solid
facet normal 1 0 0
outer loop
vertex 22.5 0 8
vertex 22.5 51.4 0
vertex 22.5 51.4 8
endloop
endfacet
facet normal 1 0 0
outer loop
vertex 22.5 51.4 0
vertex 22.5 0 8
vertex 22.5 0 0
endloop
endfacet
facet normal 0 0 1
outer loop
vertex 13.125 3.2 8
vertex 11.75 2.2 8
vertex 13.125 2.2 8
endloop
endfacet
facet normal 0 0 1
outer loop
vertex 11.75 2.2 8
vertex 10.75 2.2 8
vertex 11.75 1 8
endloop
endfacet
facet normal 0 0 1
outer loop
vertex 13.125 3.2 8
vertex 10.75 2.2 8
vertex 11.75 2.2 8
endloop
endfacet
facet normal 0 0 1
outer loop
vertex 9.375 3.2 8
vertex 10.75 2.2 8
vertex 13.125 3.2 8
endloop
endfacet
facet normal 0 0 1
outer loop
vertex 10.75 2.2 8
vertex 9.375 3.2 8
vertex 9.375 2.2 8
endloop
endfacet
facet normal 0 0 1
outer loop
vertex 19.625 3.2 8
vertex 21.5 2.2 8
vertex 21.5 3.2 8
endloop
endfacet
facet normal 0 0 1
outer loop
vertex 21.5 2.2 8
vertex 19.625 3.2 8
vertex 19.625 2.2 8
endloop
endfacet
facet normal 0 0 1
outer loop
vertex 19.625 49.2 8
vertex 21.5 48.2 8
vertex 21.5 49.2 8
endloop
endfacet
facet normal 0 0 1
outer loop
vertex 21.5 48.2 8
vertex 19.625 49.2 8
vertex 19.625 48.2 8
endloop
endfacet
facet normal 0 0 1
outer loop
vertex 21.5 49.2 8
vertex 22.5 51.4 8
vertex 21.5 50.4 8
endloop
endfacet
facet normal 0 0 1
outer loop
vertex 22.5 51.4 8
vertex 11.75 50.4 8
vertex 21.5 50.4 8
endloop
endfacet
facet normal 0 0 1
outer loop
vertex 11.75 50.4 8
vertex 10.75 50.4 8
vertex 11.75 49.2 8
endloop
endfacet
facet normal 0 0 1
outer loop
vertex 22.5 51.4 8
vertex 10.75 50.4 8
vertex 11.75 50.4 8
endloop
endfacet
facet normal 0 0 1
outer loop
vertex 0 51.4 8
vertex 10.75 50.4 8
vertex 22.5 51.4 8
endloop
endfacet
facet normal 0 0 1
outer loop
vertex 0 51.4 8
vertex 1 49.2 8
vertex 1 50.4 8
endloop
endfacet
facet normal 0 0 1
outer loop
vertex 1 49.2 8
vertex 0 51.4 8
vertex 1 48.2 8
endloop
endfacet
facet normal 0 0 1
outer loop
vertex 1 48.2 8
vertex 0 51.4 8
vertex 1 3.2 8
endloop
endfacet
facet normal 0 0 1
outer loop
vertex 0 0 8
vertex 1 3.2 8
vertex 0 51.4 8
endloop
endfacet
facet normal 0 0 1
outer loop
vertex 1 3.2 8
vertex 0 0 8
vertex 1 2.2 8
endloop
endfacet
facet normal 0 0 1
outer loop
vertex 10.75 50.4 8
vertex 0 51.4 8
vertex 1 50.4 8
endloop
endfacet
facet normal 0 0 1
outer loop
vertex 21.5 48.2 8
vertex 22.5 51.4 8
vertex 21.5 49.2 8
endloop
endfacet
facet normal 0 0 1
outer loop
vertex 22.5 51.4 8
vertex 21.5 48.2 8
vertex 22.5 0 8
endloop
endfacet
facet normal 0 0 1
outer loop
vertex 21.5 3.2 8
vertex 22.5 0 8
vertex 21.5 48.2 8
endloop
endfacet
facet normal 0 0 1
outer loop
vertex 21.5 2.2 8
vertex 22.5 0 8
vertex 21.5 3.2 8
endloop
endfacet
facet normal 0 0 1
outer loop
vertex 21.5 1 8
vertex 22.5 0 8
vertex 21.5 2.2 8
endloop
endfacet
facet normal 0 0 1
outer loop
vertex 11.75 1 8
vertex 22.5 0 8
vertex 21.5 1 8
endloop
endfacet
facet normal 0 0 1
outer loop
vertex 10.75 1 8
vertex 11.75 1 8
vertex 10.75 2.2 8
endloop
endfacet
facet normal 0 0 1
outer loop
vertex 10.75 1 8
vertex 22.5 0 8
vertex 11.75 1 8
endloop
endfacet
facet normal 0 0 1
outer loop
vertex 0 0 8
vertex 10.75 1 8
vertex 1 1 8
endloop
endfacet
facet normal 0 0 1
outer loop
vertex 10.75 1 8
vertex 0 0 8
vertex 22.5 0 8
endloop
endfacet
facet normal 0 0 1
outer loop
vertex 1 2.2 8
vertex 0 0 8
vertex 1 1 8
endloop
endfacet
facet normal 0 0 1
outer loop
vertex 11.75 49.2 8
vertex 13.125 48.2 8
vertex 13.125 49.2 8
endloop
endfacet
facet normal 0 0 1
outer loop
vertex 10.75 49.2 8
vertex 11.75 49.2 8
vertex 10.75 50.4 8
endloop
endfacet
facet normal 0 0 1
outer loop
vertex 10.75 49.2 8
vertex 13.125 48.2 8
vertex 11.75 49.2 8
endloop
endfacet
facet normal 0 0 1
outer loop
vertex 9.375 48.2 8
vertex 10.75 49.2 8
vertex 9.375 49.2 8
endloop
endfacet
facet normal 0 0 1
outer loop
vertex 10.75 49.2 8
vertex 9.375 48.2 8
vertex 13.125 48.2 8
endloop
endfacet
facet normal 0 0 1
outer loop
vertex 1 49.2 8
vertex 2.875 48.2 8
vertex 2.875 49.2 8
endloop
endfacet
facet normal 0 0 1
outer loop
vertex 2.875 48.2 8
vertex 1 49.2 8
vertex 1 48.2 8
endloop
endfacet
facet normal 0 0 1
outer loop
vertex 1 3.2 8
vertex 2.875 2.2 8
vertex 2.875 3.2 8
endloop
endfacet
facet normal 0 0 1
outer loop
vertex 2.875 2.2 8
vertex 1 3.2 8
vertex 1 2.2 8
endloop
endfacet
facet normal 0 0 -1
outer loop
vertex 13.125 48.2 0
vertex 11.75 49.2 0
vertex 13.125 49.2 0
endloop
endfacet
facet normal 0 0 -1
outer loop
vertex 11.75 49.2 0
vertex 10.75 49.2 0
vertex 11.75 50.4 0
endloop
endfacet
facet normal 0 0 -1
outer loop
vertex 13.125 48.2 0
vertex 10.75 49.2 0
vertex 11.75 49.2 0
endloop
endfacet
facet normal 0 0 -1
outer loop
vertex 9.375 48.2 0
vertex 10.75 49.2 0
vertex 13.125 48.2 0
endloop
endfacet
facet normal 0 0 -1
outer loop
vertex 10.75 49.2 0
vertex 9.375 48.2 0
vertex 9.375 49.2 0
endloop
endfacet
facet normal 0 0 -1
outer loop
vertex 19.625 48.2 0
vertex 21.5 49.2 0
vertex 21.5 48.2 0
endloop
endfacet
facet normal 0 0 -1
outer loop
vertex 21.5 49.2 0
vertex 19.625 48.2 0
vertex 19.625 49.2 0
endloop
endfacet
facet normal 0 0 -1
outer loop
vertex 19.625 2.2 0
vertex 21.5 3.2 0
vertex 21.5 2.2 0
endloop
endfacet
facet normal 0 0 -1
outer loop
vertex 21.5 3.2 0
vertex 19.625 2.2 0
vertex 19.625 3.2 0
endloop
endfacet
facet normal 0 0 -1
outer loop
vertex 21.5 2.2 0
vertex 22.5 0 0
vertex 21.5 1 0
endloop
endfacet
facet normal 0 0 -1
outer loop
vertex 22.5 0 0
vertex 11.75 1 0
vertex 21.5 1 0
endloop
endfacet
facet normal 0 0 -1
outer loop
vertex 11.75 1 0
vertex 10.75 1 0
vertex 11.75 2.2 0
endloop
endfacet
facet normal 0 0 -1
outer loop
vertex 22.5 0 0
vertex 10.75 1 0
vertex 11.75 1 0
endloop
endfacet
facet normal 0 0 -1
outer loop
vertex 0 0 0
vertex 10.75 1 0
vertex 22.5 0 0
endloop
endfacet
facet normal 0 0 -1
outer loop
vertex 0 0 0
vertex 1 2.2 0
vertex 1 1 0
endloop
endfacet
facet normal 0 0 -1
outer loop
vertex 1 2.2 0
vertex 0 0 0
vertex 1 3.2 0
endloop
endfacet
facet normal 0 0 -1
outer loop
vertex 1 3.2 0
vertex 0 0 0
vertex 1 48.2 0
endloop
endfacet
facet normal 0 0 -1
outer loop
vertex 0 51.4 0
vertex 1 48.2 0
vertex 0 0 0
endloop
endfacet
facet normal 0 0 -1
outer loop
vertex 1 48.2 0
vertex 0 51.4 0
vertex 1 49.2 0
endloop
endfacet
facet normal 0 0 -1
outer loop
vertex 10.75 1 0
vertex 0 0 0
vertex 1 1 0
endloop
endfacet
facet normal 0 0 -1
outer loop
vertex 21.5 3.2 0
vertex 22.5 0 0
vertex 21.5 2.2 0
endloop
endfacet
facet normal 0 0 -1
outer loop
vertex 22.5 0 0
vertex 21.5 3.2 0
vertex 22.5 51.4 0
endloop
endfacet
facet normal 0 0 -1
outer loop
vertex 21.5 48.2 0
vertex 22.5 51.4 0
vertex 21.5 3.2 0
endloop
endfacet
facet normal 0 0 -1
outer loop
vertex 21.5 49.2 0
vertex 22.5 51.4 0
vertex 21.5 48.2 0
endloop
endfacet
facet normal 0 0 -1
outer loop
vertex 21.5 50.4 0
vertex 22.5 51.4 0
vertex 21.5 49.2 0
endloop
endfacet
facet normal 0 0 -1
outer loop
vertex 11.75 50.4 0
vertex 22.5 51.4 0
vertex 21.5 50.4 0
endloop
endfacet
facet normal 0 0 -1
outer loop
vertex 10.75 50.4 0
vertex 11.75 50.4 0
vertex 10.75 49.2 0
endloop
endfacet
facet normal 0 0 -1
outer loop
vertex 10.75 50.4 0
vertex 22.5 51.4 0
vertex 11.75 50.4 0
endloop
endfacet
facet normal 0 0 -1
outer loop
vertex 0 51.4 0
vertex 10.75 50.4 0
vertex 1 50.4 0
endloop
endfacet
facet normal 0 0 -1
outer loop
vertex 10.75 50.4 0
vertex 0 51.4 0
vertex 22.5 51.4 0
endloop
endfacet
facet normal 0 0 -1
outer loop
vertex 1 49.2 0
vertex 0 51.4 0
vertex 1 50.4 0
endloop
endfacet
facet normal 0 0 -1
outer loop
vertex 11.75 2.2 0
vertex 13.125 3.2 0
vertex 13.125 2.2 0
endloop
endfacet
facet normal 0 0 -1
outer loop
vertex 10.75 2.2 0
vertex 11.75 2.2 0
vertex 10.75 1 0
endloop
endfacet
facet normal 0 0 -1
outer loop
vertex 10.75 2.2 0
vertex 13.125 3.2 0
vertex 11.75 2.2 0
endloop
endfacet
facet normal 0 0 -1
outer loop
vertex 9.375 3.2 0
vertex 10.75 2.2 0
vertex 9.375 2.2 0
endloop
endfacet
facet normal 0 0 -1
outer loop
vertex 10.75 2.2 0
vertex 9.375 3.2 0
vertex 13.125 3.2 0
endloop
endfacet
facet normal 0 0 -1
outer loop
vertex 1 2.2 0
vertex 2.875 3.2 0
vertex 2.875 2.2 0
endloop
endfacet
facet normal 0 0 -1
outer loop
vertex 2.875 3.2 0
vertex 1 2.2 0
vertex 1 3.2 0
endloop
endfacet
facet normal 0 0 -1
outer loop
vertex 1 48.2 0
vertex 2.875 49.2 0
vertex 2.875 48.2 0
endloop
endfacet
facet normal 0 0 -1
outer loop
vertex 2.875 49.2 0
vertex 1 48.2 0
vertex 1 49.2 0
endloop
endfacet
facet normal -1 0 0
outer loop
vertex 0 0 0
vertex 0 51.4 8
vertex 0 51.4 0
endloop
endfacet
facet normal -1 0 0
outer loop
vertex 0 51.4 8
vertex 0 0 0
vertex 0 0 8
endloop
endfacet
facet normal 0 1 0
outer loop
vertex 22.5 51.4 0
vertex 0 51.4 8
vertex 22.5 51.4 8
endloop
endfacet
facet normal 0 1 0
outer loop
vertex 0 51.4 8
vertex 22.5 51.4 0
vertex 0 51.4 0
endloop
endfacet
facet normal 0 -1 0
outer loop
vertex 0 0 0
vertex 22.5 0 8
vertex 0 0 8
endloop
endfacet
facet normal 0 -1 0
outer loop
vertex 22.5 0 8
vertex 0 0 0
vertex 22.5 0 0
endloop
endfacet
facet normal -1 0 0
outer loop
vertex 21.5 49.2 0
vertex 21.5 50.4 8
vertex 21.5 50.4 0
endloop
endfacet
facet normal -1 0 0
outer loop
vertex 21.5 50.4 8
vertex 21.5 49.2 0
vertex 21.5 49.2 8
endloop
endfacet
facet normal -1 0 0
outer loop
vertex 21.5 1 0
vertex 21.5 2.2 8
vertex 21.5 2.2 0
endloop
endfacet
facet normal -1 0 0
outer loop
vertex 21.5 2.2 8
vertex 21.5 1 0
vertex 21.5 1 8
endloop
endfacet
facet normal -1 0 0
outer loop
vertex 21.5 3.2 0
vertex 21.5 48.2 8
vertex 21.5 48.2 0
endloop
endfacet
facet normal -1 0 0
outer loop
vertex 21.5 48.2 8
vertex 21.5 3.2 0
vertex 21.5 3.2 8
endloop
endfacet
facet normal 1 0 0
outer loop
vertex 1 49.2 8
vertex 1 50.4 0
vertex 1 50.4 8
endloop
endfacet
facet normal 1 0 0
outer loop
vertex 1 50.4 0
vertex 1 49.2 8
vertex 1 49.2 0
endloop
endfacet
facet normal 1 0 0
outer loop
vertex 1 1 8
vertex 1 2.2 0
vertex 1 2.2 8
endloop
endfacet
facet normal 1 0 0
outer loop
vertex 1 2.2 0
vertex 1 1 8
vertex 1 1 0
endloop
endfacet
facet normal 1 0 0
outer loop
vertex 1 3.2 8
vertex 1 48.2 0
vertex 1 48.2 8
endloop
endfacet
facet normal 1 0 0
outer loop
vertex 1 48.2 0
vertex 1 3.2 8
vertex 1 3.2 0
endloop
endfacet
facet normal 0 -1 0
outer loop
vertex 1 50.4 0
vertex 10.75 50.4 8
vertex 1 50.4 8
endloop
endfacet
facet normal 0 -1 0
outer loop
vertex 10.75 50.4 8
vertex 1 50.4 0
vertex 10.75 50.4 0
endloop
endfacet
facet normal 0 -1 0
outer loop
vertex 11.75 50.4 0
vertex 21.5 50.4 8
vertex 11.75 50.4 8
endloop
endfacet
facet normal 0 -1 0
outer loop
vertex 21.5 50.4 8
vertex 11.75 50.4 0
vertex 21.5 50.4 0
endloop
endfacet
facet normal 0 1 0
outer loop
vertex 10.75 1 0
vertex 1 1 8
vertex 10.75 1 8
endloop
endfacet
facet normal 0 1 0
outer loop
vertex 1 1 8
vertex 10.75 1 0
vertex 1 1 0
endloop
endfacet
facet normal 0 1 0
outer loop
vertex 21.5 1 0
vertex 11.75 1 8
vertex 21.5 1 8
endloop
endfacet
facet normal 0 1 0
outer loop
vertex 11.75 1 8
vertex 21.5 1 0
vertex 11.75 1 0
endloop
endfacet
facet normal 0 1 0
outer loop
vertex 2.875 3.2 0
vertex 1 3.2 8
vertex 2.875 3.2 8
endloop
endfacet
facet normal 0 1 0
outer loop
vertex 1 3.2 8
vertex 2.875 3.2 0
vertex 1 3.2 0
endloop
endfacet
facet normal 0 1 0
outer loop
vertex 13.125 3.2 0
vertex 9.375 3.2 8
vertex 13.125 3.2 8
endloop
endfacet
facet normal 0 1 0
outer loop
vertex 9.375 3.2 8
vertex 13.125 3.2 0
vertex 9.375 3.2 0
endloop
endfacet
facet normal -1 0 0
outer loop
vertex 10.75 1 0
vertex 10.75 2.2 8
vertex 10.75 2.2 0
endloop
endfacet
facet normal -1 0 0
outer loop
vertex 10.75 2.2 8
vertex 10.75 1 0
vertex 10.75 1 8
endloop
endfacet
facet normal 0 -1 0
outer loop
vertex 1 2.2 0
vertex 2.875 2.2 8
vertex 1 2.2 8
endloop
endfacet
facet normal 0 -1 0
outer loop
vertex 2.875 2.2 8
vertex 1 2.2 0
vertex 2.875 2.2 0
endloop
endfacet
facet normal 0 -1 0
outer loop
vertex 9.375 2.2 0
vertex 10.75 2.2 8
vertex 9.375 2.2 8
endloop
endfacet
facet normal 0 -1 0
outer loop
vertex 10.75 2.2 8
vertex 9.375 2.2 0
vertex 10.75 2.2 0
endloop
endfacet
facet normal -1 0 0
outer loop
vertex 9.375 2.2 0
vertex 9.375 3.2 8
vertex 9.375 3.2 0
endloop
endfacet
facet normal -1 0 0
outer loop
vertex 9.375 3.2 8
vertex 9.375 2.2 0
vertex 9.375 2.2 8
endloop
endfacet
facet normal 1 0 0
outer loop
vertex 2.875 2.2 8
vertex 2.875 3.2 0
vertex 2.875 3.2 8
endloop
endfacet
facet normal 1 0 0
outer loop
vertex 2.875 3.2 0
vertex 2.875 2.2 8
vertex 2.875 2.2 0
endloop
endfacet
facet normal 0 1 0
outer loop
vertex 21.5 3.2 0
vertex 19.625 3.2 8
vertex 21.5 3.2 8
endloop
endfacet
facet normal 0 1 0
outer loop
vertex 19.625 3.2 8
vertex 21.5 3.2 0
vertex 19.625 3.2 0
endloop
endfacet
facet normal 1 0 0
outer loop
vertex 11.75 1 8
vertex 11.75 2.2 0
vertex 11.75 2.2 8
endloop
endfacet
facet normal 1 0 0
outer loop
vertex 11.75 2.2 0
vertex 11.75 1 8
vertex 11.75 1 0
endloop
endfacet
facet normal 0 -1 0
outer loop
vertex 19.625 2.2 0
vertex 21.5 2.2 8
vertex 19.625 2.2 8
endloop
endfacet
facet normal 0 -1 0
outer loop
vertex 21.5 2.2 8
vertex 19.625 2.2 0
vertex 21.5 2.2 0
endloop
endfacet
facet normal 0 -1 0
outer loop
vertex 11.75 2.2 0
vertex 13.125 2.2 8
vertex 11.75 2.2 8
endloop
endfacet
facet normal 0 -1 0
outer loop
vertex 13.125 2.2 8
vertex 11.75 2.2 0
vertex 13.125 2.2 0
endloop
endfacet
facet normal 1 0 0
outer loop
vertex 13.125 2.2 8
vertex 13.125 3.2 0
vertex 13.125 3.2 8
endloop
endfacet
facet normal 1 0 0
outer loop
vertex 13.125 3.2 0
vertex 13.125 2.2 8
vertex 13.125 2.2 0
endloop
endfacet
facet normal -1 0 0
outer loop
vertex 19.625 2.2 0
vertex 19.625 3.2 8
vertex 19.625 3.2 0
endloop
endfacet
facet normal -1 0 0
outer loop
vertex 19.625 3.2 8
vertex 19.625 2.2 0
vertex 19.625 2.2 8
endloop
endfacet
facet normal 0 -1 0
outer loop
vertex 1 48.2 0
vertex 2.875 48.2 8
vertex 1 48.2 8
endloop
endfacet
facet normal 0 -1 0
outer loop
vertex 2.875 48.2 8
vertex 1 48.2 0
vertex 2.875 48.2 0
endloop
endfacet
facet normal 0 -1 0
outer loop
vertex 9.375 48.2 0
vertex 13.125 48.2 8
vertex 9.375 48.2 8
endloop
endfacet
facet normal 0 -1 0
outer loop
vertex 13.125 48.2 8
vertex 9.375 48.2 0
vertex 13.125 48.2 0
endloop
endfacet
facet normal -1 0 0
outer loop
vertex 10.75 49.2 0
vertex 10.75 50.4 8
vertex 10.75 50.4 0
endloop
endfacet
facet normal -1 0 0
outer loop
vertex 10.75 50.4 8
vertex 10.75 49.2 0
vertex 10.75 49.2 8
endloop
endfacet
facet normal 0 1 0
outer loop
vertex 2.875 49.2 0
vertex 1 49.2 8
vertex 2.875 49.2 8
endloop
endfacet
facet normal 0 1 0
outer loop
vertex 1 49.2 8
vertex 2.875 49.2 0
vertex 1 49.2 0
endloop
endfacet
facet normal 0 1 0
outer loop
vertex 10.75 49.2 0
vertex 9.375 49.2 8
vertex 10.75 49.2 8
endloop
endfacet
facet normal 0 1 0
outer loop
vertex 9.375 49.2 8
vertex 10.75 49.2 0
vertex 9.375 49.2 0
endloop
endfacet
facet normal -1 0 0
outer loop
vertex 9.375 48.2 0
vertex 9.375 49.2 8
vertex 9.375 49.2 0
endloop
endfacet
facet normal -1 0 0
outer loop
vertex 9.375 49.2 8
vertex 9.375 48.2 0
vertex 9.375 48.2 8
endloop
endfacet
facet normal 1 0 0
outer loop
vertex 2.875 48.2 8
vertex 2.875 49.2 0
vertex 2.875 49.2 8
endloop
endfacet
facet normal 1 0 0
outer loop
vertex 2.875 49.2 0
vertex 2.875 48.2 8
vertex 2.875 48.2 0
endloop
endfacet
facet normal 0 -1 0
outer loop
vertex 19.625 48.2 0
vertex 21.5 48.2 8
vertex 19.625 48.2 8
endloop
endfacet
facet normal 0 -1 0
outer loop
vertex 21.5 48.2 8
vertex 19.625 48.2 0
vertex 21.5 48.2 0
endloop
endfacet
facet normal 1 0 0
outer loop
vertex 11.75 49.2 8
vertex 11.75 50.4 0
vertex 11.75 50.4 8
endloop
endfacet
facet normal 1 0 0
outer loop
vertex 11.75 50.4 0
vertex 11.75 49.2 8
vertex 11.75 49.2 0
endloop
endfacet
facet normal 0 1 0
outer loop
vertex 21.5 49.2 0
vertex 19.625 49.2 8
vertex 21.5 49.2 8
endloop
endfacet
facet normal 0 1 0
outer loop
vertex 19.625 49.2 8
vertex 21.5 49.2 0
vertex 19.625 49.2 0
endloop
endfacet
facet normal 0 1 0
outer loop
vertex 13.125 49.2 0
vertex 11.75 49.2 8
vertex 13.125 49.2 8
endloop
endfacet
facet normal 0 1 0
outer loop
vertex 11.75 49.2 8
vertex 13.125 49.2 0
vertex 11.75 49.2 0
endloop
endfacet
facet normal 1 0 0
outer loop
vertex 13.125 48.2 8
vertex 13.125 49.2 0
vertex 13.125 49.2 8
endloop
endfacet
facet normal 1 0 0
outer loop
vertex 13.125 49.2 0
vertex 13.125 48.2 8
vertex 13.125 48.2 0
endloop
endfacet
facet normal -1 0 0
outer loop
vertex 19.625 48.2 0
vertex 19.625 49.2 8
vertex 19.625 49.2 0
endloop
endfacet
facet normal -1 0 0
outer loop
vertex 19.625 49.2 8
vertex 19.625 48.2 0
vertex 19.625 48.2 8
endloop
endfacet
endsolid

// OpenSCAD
MAGIC = 1;

module contact_slot(
    wall_thickness,
    contact_slot_height,
    contact_slot_width,
    contact_slot_depth,
    contact_slot_gap
) {
    difference() {
        cube([
            contact_slot_width,
            contact_slot_depth,
            contact_slot_height
        ]);
        translate([
            0,
            0,
            - MAGIC
        ]) 
        cube([
            contact_slot_width - wall_thickness / 2 ,
            contact_slot_depth - wall_thickness,
            contact_slot_height + MAGIC * 2
        ]);
        translate([
            (contact_slot_width - contact_slot_gap) / 2,
            contact_slot_depth - wall_thickness - MAGIC,
            -MAGIC
        ]) 
        cube([
            contact_slot_gap,
            wall_thickness + MAGIC * 2,
            contact_slot_height + MAGIC * 2
        ]);
    }

}

module battery_holder(
    batteries_width = 20.5,
    batteries_length = 45,
    wall_thickness = 1,
    contact_slot_depth = 2.2,
    contact_slot_gap = 6.5,
    box_height =  8,
) {

    external_width = batteries_width + wall_thickness * 2;
    external_length = batteries_length + wall_thickness * 2 + contact_slot_depth * 2;
    difference() {
        cube([
            external_width,
            external_length,
            box_height
        ]);
        translate([
            wall_thickness,
            wall_thickness,
            - MAGIC
        ]) 
        cube([
            batteries_width,
            batteries_length + contact_slot_depth * 2,
            box_height  + MAGIC * 2
        ]);
    }

    for(iy = [0 : 1])
    mirror([
        0,
        iy,
        0
    ])
    translate([
        0,
        - iy * external_length
    ]) 
    union() {
        for(ix = [0 : 1])
        translate([
            wall_thickness + ix * batteries_width,
            wall_thickness
        ]) 
        mirror([-ix,0,0]) 
        contact_slot(
            wall_thickness = wall_thickness,
            contact_slot_height = box_height,
            contact_slot_width = batteries_width / 2,
            contact_slot_depth = contact_slot_depth,
            contact_slot_gap = contact_slot_gap
        );
    }
}

battery_holder();
